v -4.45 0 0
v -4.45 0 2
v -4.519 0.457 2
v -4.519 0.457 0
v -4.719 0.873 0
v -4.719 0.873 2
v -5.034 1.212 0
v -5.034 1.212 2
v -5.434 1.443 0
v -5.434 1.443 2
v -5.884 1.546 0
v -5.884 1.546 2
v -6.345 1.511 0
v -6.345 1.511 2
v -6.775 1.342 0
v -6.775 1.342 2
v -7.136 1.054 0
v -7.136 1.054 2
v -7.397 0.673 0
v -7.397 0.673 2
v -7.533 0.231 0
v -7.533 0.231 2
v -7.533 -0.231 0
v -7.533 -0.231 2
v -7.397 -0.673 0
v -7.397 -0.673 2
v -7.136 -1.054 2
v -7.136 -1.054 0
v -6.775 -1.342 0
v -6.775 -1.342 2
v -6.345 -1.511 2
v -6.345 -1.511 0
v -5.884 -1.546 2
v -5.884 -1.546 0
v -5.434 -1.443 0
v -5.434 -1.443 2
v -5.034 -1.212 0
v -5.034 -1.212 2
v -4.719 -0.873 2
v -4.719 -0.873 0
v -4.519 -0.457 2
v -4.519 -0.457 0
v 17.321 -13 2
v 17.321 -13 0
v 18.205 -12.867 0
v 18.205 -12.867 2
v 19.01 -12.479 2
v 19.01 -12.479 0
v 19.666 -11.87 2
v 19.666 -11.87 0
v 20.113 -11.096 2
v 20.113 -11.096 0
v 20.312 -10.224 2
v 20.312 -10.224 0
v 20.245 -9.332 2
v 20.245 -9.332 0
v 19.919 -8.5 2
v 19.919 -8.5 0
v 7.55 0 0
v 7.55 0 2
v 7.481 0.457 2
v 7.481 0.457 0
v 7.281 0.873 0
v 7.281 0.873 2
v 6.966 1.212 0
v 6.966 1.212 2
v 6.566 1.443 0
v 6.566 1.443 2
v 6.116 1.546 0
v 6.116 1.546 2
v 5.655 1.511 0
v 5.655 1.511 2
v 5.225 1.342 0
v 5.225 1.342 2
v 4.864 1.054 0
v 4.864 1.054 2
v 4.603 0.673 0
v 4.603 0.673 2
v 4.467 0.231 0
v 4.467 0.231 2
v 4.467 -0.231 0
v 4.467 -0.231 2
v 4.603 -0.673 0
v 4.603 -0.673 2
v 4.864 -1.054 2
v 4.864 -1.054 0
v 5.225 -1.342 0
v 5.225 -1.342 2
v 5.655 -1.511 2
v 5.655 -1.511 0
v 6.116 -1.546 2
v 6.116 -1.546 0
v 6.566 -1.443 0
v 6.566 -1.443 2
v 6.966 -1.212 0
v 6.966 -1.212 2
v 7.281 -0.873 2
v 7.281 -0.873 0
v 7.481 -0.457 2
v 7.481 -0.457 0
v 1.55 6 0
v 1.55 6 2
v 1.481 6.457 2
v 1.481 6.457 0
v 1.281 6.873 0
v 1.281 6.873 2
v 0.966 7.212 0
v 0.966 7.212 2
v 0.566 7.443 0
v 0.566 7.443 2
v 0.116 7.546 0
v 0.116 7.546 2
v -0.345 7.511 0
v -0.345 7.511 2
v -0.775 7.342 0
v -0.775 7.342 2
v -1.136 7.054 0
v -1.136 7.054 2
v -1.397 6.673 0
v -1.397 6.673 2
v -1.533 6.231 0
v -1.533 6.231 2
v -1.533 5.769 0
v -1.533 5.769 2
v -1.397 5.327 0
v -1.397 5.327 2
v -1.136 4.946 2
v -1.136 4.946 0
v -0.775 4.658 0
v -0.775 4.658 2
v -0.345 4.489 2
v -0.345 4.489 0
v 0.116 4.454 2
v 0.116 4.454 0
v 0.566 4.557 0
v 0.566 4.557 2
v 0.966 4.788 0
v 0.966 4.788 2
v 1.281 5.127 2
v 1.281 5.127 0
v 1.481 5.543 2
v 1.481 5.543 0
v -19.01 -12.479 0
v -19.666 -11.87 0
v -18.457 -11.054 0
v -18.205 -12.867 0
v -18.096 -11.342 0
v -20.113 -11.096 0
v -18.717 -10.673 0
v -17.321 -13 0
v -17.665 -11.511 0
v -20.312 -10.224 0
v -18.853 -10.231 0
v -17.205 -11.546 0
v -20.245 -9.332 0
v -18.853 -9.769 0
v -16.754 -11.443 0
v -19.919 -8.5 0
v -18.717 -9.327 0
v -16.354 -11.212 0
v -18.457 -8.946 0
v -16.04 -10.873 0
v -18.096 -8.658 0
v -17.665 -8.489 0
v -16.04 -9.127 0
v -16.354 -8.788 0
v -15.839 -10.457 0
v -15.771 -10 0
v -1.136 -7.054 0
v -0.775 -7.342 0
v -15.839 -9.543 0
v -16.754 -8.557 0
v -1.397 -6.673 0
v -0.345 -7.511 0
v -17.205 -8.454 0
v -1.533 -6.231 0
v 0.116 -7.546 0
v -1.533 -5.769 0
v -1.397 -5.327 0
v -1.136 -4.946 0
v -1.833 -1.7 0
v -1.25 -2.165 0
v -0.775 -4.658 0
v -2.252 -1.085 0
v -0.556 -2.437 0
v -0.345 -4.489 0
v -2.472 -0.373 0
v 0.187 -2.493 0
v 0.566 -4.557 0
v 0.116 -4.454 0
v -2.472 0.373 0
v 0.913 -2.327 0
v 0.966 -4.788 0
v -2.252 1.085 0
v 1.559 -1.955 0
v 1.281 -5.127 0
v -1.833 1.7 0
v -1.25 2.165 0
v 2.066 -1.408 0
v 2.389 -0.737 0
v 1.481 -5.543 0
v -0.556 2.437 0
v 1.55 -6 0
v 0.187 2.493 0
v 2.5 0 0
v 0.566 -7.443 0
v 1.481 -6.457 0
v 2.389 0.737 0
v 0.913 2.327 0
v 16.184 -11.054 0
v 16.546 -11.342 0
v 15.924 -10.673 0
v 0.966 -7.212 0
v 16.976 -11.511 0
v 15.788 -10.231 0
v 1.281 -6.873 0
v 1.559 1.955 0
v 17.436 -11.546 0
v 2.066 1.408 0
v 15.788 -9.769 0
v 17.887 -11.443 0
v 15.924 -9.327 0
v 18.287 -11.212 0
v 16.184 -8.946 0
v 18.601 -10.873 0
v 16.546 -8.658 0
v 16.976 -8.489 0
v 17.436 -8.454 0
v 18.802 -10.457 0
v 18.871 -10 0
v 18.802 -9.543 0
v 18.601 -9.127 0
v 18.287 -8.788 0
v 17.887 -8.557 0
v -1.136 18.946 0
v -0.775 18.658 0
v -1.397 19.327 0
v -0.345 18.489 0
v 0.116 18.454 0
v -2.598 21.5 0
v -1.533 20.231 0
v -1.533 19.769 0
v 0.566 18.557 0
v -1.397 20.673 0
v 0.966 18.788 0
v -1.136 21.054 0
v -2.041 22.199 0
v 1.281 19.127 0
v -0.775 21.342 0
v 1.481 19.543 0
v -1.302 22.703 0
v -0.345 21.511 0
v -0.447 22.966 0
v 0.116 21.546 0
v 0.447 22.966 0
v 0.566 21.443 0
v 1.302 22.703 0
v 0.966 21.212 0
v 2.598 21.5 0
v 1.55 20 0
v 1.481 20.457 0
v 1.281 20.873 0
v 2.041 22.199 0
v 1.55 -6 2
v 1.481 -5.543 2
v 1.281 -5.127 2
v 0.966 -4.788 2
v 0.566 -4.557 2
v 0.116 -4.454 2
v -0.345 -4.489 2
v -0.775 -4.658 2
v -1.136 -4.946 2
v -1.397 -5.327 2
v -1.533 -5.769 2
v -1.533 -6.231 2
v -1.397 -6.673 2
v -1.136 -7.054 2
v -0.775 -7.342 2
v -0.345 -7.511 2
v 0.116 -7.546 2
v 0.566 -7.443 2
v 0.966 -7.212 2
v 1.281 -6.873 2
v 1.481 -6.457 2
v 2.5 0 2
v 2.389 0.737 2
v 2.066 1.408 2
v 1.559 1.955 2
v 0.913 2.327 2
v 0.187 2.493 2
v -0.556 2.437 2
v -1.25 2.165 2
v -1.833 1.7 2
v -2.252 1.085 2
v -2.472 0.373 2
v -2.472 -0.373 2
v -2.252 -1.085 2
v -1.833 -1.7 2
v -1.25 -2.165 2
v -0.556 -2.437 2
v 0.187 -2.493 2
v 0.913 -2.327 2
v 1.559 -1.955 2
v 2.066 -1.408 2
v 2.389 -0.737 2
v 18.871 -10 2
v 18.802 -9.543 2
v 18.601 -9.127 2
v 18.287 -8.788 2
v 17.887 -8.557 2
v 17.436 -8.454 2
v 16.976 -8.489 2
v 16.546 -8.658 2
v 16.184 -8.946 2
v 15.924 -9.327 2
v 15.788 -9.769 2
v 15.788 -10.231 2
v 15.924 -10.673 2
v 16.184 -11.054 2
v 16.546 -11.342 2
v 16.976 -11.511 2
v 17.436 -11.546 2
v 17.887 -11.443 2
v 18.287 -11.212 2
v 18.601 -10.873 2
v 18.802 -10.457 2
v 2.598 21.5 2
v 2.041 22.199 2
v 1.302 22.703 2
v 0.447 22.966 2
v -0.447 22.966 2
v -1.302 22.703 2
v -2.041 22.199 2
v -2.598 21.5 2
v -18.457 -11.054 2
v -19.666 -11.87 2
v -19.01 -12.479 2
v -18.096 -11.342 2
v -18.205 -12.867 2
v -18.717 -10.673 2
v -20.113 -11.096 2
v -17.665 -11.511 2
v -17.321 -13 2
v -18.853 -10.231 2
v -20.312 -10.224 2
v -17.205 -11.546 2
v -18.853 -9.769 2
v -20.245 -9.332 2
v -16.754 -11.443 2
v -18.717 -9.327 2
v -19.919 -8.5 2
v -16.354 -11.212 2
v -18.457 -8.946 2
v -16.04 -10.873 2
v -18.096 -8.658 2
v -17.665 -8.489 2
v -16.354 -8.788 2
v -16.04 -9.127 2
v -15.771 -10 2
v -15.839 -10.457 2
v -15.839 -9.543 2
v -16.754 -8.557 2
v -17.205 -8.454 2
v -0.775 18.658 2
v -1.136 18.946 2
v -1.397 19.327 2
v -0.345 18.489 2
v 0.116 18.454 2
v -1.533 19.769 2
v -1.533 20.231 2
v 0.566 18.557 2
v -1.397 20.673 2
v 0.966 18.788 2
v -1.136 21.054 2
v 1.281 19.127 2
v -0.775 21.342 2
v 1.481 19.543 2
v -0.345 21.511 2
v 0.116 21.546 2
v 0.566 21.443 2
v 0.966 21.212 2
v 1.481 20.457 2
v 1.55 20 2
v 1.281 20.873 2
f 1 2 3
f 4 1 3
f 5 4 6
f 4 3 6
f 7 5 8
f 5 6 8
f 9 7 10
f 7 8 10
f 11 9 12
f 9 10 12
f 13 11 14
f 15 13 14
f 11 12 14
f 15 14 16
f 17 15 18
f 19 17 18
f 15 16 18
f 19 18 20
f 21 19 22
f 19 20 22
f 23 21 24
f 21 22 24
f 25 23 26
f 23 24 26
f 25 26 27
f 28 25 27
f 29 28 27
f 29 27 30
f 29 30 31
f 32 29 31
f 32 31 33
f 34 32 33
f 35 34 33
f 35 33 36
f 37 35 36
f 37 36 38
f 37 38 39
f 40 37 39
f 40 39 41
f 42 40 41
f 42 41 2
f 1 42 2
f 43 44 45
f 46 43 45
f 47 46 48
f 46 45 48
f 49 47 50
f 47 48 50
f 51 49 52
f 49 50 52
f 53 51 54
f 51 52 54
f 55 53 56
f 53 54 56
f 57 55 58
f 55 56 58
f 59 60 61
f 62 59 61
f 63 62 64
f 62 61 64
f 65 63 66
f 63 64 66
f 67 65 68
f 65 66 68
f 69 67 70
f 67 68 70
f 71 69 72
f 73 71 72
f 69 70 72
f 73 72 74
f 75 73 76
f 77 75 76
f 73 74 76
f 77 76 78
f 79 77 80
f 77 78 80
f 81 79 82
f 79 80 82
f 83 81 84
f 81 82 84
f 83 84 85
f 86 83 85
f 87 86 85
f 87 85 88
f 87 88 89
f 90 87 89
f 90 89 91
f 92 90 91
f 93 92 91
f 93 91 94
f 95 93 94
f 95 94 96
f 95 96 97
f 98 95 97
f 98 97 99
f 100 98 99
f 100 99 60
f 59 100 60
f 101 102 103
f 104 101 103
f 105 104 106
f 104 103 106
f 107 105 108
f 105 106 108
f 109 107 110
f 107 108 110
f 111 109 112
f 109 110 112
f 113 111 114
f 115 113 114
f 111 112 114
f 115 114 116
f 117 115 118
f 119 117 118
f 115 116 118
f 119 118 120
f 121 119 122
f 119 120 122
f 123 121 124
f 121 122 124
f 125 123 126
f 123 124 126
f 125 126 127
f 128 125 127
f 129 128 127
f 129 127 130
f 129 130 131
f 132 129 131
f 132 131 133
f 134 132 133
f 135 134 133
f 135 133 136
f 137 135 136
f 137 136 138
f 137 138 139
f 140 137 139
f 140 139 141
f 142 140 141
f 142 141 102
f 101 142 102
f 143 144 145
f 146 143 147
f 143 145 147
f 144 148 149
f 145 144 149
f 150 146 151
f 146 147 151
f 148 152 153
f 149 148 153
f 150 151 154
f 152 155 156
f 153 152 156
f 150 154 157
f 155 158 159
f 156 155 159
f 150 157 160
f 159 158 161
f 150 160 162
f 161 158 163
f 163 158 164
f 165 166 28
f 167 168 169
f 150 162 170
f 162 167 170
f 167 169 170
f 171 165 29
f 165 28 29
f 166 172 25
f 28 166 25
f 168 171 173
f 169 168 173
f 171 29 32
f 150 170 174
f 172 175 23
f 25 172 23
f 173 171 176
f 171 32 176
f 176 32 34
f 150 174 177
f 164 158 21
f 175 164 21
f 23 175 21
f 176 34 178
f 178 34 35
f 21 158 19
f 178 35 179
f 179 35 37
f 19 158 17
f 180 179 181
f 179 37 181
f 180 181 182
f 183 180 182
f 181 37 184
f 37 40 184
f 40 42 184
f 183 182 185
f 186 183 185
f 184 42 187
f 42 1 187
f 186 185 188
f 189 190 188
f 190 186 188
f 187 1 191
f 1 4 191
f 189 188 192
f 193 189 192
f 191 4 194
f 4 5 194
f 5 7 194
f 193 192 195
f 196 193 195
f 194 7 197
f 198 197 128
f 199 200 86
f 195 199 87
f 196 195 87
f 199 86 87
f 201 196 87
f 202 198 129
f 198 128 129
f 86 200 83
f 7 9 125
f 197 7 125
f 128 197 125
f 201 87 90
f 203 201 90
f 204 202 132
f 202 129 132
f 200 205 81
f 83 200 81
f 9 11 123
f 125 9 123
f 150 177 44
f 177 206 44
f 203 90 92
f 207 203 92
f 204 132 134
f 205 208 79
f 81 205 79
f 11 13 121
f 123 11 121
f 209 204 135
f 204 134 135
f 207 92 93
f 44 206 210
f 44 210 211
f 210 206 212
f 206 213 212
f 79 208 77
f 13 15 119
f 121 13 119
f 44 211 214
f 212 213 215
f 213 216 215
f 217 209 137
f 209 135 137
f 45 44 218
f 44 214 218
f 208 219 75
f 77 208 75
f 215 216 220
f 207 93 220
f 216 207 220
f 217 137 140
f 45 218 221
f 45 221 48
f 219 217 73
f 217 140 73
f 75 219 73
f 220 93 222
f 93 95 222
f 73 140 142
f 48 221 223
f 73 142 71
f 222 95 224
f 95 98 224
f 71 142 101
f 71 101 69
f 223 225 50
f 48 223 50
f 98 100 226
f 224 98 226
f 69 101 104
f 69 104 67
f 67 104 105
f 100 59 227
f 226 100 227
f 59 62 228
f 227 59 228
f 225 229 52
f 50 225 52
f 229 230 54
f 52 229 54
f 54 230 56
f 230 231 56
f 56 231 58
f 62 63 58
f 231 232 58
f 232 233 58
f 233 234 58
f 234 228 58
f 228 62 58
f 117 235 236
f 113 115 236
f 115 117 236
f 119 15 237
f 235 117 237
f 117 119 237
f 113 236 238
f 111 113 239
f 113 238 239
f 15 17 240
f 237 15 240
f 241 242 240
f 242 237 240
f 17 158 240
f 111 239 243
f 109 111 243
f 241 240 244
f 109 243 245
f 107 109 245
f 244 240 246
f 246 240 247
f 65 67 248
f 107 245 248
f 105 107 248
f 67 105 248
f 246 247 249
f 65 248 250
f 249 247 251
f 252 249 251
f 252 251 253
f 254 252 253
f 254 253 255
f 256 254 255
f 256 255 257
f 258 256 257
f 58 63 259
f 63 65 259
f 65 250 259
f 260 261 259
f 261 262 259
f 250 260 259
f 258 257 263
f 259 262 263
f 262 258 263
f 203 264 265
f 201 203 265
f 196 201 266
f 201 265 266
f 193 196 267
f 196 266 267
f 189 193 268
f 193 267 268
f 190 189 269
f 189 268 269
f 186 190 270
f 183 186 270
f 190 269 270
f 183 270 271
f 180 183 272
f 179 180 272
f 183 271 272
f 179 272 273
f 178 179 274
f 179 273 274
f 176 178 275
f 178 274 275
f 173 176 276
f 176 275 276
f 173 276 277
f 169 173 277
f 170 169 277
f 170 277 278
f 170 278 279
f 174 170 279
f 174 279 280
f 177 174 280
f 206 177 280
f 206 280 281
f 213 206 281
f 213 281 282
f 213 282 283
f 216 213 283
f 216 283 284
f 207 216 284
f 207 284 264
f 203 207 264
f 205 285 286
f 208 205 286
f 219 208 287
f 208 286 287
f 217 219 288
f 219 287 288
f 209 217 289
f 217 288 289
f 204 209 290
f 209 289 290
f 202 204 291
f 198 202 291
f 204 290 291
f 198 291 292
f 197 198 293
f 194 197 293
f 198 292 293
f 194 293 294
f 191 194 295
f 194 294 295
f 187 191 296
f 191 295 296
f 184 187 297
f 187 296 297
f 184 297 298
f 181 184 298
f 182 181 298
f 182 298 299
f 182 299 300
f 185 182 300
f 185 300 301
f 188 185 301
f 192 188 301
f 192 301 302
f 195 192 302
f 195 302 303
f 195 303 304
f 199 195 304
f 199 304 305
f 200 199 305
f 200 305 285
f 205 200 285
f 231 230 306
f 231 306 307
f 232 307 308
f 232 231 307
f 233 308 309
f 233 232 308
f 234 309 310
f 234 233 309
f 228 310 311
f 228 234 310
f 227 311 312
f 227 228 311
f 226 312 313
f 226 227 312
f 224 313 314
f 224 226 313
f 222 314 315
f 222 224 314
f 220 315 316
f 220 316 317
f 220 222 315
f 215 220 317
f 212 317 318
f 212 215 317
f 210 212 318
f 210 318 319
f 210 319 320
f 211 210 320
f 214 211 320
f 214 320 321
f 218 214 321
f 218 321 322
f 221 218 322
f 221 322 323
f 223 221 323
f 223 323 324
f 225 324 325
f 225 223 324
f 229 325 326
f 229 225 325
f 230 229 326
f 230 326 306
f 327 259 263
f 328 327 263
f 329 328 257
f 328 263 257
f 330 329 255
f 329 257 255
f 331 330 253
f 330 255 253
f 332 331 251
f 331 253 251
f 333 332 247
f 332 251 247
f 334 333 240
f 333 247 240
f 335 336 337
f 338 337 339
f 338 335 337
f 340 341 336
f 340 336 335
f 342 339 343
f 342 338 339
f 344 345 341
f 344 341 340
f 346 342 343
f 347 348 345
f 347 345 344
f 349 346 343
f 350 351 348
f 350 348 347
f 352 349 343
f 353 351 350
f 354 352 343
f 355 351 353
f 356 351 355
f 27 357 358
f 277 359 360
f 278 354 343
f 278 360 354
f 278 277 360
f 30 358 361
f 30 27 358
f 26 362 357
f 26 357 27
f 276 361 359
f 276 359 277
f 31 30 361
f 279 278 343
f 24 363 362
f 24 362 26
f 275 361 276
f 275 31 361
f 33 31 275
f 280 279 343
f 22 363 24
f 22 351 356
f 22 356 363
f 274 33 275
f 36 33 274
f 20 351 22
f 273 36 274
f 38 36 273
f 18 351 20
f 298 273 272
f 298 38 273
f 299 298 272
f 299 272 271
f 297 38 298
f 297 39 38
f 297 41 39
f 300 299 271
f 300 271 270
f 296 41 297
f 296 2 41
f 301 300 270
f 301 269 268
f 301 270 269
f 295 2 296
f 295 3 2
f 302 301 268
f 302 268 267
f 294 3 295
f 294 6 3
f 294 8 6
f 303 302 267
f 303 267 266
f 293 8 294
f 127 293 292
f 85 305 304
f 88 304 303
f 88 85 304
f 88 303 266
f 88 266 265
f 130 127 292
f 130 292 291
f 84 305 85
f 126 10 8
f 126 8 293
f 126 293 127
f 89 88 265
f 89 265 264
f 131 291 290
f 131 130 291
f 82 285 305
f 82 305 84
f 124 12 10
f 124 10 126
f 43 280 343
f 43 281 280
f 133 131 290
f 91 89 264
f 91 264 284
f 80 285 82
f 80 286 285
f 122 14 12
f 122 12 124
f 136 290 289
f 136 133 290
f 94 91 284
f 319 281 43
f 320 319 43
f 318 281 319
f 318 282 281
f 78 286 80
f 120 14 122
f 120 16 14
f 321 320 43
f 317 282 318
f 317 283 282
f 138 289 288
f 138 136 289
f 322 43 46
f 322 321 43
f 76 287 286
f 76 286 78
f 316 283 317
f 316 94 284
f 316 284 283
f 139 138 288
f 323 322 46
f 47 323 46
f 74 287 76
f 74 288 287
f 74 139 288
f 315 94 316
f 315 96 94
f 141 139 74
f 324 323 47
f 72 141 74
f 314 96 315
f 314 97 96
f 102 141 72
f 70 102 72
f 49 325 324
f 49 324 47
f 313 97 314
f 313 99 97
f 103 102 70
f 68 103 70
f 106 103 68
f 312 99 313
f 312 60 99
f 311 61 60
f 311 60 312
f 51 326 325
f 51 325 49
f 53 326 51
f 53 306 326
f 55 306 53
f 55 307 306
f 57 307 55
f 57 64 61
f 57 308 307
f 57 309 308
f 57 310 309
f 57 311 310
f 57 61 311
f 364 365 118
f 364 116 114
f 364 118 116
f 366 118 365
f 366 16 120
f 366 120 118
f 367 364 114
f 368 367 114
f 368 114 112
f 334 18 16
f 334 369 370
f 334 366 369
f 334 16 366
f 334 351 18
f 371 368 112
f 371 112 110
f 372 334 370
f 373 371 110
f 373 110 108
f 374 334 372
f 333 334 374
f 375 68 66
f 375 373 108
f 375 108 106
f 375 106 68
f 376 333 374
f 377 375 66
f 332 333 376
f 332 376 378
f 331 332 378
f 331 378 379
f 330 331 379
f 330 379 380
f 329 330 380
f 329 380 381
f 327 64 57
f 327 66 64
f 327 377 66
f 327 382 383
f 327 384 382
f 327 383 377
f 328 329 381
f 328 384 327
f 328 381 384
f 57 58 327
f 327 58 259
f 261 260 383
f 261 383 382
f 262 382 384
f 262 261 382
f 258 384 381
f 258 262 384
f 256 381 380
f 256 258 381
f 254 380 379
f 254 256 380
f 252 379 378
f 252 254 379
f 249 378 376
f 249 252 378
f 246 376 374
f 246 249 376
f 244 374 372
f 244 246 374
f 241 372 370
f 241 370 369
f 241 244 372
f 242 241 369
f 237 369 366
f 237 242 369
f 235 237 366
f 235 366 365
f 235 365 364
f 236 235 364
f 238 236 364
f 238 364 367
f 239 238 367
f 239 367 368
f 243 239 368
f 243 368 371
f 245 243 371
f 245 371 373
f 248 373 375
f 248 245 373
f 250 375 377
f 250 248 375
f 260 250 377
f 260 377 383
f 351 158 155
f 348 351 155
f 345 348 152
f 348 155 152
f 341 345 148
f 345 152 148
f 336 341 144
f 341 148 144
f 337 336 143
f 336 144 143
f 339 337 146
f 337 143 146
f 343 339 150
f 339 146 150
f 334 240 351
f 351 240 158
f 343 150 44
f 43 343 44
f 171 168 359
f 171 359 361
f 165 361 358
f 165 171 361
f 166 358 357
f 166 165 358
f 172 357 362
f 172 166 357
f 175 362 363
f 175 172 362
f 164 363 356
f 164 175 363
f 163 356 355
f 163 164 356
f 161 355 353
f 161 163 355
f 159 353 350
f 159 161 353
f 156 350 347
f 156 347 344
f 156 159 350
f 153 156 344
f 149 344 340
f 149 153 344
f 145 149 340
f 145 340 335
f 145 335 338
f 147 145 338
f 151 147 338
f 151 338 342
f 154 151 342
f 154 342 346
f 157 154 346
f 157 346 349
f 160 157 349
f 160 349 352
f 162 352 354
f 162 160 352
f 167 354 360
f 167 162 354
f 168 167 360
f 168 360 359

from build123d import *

# Parameters (mm, degrees)
SKETCH_1_R          = 1.55
EXTRUDE_1_DEPTH     = 2
SKETCH_2_R          = 1.55
CUT_EXTRUDE_1_DEPTH = 3
SKETCH_4_R          = 2.5
CUT_EXTRUDE_2_DEPTH = 3


with BuildPart() as part:
    # 草图1 → 凸台-拉伸1 (new body)
    with BuildSketch(Plane.XY):
        with BuildLine():
            Line((-2.598076211, 21.5), (-19.918584287, -8.5))
            ThreePointArc((-19.918584287, -8.5), (-19.918584287, -11.5), (-17.320508076, -13))
            Line((-17.320508076, -13), (17.320508076, -13))
            ThreePointArc((17.320508076, -13), (19.918584287, -11.5), (19.918584287, -8.5))
            Line((19.918584287, -8.5), (2.598076211, 21.5))
            ThreePointArc((2.598076211, 21.5), (0, 23), (-2.598076211, 21.5))
        make_face()
        with Locations((0, 20)):
            Circle(SKETCH_1_R, mode=Mode.SUBTRACT)
        with Locations((17.320508076, -10)):
            Circle(SKETCH_1_R, mode=Mode.SUBTRACT)
        with Locations((-17.320508076, -10)):
            Circle(SKETCH_1_R, mode=Mode.SUBTRACT)
    extrude(amount=EXTRUDE_1_DEPTH)

    # 草图2 → 切除-拉伸1 (cut)
    with BuildSketch(Plane.XY.offset(2)):
        with Locations((0, 6)):
            Circle(SKETCH_2_R)
        with Locations((6, 0)):
            Circle(SKETCH_2_R)
        with Locations((0, -6)):
            Circle(SKETCH_2_R)
        with Locations((-6, 0)):
            Circle(SKETCH_2_R)
    extrude(amount=-CUT_EXTRUDE_1_DEPTH, mode=Mode.SUBTRACT)

    # 草图4 → 切除-拉伸2 (cut)
    with BuildSketch(Plane.XY.offset(2)):
        Circle(SKETCH_4_R)
    extrude(amount=-CUT_EXTRUDE_2_DEPTH, mode=Mode.SUBTRACT)


solid = part.part
